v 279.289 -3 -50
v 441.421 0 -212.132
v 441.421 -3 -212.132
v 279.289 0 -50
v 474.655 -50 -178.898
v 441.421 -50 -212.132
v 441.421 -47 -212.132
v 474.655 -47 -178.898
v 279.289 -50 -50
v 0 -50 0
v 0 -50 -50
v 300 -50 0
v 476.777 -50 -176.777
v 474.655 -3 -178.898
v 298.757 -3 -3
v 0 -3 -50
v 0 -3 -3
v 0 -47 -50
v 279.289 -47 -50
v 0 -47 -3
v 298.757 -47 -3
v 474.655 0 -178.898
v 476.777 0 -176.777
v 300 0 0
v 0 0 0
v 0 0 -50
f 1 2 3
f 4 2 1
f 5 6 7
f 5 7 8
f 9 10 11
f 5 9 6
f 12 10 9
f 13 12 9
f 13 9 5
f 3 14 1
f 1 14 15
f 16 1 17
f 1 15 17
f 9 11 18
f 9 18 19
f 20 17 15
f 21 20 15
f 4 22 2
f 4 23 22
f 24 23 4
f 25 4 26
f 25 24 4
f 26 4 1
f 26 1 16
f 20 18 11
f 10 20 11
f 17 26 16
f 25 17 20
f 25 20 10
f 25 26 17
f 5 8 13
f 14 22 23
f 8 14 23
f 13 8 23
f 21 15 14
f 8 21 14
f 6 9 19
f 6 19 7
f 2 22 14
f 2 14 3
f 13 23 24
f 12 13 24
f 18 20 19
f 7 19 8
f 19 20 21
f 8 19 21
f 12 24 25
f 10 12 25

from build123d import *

# Parameters (mm, degrees)
F1_DEPTH = 50
F3_DEPTH = 3
F5_DEPTH = 3


with BuildPart() as f1:
    # F0 (on Front) → F1 (new body)
    with BuildSketch(Plane.XZ):
        Polygon((300, 0), (0, 0), (0, -3), (298.757359, -3), (474.655375, -178.898016), (476.776695, -176.776695), align=None)
    extrude(amount=F1_DEPTH)

    # F2 (on face) → F3 (join)
    with BuildSketch(Plane.XZ.offset(50)):
        Polygon((474.655375, -178.898016), (298.757359, -3), (0, -3), (0, -50), (279.289322, -50), (441.421356, -212.132034), align=None)
    extrude(amount=-F3_DEPTH)

    # F4 (on face) → F5 (join)
    with BuildSketch(Plane(origin=(0, 0, 0), x_dir=(-1, 0, 0), z_dir=(0, 1, 0))):
        Polygon((-298.757359, -3), (-474.655375, -178.898016), (-441.421356, -212.132034), (-279.289322, -50), (0, -50), (0, -3), align=None)
    extrude(amount=-F5_DEPTH)


solid = f1.part
